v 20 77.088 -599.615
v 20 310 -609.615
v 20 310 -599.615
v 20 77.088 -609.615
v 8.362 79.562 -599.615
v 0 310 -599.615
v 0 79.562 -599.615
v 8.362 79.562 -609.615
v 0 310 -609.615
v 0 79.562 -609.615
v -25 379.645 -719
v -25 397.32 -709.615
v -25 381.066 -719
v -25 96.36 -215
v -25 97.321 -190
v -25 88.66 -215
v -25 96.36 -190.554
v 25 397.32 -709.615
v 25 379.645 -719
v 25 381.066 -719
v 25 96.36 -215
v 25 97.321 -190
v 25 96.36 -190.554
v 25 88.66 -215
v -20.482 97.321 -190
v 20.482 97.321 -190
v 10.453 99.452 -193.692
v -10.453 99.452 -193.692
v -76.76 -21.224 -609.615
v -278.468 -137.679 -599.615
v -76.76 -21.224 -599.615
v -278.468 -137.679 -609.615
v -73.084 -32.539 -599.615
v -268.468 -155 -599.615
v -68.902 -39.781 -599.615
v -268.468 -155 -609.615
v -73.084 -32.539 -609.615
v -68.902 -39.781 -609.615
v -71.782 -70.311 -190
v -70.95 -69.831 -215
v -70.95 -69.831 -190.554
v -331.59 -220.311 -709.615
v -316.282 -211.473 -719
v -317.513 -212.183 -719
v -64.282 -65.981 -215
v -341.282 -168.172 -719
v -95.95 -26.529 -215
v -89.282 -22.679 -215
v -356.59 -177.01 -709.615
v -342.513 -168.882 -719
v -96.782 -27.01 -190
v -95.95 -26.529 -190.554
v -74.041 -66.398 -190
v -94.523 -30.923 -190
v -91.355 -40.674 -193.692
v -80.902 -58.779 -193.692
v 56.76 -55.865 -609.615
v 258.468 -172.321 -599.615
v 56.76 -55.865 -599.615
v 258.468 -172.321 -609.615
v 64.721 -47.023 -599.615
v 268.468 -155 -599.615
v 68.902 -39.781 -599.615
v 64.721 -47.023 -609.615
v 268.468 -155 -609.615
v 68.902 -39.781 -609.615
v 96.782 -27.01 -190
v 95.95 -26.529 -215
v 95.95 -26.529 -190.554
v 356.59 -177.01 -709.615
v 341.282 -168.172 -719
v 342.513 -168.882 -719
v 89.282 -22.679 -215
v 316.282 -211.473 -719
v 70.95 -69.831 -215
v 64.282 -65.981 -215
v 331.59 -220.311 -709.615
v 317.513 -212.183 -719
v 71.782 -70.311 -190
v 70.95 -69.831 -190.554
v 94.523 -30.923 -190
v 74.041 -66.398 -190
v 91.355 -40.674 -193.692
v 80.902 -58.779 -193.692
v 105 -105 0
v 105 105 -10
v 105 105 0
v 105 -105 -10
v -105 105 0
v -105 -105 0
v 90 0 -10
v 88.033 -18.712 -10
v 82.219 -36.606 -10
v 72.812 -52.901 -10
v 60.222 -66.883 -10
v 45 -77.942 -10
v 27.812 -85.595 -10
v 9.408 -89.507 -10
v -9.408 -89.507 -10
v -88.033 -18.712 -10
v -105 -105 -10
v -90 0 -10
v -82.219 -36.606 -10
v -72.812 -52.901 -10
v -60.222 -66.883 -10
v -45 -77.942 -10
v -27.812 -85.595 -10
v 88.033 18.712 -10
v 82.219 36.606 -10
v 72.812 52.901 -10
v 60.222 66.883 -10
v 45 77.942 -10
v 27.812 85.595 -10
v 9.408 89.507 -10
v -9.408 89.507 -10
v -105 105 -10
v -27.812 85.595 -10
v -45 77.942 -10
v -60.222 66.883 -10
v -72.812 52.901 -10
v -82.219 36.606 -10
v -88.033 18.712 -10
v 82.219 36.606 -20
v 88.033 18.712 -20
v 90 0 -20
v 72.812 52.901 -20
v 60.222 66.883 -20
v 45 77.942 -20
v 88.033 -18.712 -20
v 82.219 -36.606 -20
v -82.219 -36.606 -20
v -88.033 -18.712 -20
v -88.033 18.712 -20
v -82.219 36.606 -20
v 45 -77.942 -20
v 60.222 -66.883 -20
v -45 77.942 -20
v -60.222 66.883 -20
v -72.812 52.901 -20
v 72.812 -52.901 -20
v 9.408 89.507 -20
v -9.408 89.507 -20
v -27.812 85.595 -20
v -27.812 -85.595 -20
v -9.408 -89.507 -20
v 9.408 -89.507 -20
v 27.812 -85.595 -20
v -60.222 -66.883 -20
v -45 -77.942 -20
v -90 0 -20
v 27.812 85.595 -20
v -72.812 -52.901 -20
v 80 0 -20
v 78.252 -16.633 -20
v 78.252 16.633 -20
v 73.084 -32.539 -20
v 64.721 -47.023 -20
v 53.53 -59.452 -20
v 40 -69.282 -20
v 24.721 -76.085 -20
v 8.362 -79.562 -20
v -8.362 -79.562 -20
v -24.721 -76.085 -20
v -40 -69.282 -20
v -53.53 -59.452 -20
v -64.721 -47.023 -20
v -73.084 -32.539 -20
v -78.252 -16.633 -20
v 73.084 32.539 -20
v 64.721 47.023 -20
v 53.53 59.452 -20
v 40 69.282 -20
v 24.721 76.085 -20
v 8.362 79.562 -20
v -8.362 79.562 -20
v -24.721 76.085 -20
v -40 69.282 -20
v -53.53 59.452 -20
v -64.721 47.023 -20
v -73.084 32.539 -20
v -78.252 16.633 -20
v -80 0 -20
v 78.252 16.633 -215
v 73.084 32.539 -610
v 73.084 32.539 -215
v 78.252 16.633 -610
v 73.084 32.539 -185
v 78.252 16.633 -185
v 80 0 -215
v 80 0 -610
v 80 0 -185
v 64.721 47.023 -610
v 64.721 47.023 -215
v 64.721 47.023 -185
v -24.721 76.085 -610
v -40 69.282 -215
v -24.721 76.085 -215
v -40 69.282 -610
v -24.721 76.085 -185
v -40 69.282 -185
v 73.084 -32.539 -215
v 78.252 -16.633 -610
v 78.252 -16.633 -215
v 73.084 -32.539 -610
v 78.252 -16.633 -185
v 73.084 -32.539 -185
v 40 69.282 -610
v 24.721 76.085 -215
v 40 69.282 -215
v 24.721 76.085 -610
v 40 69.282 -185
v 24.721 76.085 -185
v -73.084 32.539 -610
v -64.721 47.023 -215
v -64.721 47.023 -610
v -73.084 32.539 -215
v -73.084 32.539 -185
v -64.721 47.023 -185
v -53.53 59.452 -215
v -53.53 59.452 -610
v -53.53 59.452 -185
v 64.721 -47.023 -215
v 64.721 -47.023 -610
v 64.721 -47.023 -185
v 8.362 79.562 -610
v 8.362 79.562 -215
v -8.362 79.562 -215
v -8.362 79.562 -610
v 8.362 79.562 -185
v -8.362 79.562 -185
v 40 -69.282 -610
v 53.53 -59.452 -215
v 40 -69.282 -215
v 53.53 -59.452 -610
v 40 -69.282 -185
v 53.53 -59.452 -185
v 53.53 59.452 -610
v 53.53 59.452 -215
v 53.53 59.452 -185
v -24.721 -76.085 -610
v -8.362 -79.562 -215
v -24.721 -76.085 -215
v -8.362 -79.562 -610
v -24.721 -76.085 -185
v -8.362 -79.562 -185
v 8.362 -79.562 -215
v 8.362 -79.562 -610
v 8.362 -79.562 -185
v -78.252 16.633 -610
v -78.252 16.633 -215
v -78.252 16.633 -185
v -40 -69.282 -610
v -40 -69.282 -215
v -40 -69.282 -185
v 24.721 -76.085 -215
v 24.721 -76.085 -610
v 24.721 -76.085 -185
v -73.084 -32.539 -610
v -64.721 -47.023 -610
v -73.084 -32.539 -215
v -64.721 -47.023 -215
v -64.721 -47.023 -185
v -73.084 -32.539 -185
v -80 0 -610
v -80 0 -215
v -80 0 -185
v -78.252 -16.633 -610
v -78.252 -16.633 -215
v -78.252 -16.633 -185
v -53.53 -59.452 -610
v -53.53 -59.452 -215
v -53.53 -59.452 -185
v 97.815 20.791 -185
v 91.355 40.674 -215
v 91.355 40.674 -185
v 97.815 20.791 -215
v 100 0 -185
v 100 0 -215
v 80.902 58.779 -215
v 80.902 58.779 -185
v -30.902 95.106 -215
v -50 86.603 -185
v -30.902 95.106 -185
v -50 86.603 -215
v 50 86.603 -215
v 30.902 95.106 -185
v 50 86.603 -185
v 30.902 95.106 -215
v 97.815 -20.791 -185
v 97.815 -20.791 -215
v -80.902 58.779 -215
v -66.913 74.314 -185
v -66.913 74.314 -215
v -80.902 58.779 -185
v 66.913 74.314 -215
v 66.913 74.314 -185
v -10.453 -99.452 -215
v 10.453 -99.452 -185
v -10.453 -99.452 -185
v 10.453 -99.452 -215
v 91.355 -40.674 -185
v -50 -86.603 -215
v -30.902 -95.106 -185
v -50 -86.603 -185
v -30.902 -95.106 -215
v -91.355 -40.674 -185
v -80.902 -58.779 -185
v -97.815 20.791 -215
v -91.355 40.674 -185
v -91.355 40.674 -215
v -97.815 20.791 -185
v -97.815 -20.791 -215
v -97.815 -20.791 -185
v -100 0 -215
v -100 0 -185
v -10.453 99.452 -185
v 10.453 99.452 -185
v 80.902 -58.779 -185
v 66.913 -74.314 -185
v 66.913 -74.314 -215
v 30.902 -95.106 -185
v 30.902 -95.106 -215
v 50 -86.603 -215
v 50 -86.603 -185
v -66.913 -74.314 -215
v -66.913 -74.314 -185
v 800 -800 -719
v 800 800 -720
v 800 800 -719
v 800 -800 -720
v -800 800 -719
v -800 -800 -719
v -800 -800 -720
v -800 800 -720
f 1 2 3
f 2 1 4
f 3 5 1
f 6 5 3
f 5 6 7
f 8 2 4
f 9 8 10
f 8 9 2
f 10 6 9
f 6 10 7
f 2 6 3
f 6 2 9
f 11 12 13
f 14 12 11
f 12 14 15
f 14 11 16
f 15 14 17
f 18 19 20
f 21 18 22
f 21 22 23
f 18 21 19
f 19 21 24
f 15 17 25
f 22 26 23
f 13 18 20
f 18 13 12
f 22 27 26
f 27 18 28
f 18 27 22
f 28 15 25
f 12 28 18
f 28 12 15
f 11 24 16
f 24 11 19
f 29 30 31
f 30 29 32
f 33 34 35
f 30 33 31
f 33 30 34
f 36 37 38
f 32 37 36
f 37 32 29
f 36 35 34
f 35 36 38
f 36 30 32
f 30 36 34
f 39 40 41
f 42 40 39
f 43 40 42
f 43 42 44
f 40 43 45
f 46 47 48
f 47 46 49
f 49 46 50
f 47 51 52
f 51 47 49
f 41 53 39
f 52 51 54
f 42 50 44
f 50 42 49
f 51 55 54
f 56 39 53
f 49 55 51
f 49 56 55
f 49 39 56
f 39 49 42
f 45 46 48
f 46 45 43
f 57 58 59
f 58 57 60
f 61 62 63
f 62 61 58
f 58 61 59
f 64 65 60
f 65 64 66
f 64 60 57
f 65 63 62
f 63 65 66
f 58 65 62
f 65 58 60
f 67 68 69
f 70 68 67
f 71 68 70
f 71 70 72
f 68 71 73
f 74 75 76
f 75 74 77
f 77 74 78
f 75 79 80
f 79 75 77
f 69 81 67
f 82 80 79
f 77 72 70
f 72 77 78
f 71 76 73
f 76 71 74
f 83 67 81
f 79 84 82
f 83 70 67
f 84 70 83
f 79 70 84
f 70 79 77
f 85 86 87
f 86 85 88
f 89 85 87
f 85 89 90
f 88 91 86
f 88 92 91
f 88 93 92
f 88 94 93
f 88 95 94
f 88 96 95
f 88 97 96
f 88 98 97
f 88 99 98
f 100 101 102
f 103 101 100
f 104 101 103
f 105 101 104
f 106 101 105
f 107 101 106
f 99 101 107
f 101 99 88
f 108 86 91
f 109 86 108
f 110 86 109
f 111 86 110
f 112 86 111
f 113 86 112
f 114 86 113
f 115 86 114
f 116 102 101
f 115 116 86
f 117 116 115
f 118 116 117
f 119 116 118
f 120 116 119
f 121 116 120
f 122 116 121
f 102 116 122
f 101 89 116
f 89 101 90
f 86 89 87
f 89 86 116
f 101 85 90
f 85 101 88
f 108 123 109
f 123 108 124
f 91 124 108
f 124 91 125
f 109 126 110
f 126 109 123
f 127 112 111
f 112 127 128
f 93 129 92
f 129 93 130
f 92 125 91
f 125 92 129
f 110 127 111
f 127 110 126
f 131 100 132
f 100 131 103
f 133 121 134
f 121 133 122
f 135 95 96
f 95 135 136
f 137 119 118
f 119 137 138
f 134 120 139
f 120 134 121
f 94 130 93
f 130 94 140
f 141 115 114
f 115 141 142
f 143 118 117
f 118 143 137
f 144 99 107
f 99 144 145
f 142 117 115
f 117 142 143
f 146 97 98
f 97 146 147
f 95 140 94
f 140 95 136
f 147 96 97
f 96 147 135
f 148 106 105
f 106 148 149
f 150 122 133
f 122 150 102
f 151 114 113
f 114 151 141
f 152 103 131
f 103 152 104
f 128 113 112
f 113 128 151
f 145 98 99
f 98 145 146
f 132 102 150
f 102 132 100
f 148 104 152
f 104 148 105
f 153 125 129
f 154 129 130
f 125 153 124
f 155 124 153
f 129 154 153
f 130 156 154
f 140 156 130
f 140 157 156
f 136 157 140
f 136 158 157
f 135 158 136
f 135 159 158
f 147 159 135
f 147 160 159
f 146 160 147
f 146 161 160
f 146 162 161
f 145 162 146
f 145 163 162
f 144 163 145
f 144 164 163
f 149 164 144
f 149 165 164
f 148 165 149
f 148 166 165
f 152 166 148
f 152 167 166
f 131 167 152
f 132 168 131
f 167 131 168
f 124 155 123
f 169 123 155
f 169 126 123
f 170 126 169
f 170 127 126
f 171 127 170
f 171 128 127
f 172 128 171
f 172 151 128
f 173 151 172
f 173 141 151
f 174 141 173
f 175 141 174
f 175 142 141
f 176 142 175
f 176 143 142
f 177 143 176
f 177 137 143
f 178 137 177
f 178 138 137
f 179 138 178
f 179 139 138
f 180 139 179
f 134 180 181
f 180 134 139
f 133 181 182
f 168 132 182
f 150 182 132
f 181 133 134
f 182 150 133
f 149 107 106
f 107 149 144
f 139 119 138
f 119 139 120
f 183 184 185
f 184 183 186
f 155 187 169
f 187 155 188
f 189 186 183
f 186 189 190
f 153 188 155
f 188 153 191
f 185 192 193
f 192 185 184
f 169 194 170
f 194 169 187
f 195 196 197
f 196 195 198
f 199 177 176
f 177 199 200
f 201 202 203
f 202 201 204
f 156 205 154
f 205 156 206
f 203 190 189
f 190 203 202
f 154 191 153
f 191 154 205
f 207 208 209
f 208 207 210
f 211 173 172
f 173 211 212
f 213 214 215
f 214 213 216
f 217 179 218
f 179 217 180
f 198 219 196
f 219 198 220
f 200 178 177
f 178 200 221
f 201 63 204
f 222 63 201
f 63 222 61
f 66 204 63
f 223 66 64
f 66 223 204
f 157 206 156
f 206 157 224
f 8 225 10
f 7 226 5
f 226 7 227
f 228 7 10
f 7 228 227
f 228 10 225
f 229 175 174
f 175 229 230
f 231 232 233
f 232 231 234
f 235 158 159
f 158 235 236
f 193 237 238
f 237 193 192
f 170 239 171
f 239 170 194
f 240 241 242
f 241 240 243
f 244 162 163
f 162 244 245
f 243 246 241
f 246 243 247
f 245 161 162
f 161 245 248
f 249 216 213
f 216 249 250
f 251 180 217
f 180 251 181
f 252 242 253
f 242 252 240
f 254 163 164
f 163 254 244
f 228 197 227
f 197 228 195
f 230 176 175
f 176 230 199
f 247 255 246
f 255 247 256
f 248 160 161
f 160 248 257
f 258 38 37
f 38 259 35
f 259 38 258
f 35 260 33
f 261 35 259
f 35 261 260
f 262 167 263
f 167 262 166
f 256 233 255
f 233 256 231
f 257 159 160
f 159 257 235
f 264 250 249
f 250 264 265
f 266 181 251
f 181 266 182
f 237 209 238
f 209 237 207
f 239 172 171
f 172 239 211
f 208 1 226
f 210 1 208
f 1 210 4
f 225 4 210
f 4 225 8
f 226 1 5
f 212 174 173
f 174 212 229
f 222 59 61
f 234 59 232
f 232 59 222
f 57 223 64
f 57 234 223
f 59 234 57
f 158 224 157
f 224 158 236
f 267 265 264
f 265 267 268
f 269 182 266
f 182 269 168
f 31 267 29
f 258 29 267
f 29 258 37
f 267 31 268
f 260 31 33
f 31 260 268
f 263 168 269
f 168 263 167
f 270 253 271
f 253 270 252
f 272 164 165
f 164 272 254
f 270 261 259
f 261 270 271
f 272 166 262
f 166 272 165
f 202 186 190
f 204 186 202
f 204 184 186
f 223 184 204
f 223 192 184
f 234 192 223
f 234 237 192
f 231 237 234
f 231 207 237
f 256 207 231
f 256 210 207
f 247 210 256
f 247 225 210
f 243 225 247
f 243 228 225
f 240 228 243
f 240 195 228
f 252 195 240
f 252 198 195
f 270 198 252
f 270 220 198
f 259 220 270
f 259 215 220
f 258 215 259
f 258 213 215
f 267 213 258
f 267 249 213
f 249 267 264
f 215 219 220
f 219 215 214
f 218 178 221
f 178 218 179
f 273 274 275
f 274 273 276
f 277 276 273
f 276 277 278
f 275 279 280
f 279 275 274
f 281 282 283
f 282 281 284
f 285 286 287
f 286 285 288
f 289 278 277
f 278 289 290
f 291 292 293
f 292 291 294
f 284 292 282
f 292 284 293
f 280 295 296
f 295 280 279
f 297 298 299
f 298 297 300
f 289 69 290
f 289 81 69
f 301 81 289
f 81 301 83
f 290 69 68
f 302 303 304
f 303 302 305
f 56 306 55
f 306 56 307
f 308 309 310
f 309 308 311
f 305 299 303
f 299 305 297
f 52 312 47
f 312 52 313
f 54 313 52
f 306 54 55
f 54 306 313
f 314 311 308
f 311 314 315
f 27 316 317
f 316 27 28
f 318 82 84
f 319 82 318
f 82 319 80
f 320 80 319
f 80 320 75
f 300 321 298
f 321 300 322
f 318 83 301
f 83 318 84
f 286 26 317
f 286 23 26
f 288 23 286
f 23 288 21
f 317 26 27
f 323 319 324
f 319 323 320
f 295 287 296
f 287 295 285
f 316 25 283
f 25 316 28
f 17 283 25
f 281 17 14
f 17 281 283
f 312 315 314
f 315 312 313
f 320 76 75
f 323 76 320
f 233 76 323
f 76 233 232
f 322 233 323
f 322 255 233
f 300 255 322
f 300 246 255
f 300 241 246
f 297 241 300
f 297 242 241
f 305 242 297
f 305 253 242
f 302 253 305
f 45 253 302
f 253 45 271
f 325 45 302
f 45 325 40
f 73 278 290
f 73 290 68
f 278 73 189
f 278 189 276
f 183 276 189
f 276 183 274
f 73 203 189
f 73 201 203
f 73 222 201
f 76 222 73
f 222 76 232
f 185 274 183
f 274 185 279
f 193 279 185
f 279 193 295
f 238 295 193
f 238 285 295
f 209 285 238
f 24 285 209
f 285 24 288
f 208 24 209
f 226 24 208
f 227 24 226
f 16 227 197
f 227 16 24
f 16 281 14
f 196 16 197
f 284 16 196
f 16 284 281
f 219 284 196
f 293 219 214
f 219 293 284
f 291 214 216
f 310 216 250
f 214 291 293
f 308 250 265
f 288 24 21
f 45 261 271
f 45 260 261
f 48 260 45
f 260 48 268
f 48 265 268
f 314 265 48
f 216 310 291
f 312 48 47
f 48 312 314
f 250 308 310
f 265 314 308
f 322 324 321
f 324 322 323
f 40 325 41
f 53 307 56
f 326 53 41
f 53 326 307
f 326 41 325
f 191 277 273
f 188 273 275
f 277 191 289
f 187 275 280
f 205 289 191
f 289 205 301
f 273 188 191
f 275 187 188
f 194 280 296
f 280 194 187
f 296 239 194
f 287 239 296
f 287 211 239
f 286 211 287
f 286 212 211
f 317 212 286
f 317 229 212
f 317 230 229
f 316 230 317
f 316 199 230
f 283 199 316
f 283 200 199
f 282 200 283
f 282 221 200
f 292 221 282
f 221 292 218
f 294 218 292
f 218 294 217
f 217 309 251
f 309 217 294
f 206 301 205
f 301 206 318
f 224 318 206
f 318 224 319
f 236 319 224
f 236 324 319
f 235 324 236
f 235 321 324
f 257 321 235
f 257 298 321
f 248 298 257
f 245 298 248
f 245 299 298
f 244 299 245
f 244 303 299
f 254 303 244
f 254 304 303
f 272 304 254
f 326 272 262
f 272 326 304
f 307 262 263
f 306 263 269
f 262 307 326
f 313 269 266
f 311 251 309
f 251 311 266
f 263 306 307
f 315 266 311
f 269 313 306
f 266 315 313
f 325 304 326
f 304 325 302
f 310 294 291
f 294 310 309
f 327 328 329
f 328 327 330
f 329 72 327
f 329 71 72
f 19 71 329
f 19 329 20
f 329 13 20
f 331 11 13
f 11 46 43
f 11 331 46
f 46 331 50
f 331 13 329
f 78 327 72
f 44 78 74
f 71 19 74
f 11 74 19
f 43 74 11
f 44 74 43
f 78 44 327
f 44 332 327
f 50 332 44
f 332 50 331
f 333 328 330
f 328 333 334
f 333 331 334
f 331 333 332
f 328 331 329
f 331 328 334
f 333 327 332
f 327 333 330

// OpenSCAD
//三脚架 -- 参数
Tri_Pier_plate_width=210;
Tri_Pier_plate_thickness=10;
Tri_Pier_column_diameter=160;
Tri_Pier_column_height=600;

iOptron_Tri_Pier();
//三脚架的模块
module iOptron_Tri_Pier(){
//三脚架 -平面
color("black",0.4)
translate([0,0,-Tri_Pier_plate_thickness/2])
cube([Tri_Pier_plate_width,Tri_Pier_plate_width,Tri_Pier_plate_thickness],center=true);

//三脚架 -平面与立柱对接环
color("red")
translate([0,0,-1.5*Tri_Pier_plate_thickness])
cylinder(h=10,d=Tri_Pier_column_diameter+20,center=true);

//三脚架 -立柱
color("black",0.6)
translate([0,0,-Tri_Pier_column_height/2-Tri_Pier_plate_thickness])
cylinder(h=Tri_Pier_column_height,d=Tri_Pier_column_diameter,center=true);

//三脚架 -三脚架与立柱对接环
color("black")
translate([0,0,-200])
cylinder(h=30,d=Tri_Pier_column_diameter+40,center=true);

//三脚架 -三脚架的腿

for(i=[0,120,240])
    rotate([0,0,i]){
        translate([0,60,-600*cos(30)-90])
        color("black")
        cube([20,250,10]);  
translate([-25,600*sin(30)+Tri_Pier_column_diameter/2,-600*cos(30)-200]){ 
rotate([30,0,0])
    color("red")
cube([50,20,600]);}


    }
    
    //地面
    translate([-800,-800,-720])
cube([1600,1600,1]);
    
    }
